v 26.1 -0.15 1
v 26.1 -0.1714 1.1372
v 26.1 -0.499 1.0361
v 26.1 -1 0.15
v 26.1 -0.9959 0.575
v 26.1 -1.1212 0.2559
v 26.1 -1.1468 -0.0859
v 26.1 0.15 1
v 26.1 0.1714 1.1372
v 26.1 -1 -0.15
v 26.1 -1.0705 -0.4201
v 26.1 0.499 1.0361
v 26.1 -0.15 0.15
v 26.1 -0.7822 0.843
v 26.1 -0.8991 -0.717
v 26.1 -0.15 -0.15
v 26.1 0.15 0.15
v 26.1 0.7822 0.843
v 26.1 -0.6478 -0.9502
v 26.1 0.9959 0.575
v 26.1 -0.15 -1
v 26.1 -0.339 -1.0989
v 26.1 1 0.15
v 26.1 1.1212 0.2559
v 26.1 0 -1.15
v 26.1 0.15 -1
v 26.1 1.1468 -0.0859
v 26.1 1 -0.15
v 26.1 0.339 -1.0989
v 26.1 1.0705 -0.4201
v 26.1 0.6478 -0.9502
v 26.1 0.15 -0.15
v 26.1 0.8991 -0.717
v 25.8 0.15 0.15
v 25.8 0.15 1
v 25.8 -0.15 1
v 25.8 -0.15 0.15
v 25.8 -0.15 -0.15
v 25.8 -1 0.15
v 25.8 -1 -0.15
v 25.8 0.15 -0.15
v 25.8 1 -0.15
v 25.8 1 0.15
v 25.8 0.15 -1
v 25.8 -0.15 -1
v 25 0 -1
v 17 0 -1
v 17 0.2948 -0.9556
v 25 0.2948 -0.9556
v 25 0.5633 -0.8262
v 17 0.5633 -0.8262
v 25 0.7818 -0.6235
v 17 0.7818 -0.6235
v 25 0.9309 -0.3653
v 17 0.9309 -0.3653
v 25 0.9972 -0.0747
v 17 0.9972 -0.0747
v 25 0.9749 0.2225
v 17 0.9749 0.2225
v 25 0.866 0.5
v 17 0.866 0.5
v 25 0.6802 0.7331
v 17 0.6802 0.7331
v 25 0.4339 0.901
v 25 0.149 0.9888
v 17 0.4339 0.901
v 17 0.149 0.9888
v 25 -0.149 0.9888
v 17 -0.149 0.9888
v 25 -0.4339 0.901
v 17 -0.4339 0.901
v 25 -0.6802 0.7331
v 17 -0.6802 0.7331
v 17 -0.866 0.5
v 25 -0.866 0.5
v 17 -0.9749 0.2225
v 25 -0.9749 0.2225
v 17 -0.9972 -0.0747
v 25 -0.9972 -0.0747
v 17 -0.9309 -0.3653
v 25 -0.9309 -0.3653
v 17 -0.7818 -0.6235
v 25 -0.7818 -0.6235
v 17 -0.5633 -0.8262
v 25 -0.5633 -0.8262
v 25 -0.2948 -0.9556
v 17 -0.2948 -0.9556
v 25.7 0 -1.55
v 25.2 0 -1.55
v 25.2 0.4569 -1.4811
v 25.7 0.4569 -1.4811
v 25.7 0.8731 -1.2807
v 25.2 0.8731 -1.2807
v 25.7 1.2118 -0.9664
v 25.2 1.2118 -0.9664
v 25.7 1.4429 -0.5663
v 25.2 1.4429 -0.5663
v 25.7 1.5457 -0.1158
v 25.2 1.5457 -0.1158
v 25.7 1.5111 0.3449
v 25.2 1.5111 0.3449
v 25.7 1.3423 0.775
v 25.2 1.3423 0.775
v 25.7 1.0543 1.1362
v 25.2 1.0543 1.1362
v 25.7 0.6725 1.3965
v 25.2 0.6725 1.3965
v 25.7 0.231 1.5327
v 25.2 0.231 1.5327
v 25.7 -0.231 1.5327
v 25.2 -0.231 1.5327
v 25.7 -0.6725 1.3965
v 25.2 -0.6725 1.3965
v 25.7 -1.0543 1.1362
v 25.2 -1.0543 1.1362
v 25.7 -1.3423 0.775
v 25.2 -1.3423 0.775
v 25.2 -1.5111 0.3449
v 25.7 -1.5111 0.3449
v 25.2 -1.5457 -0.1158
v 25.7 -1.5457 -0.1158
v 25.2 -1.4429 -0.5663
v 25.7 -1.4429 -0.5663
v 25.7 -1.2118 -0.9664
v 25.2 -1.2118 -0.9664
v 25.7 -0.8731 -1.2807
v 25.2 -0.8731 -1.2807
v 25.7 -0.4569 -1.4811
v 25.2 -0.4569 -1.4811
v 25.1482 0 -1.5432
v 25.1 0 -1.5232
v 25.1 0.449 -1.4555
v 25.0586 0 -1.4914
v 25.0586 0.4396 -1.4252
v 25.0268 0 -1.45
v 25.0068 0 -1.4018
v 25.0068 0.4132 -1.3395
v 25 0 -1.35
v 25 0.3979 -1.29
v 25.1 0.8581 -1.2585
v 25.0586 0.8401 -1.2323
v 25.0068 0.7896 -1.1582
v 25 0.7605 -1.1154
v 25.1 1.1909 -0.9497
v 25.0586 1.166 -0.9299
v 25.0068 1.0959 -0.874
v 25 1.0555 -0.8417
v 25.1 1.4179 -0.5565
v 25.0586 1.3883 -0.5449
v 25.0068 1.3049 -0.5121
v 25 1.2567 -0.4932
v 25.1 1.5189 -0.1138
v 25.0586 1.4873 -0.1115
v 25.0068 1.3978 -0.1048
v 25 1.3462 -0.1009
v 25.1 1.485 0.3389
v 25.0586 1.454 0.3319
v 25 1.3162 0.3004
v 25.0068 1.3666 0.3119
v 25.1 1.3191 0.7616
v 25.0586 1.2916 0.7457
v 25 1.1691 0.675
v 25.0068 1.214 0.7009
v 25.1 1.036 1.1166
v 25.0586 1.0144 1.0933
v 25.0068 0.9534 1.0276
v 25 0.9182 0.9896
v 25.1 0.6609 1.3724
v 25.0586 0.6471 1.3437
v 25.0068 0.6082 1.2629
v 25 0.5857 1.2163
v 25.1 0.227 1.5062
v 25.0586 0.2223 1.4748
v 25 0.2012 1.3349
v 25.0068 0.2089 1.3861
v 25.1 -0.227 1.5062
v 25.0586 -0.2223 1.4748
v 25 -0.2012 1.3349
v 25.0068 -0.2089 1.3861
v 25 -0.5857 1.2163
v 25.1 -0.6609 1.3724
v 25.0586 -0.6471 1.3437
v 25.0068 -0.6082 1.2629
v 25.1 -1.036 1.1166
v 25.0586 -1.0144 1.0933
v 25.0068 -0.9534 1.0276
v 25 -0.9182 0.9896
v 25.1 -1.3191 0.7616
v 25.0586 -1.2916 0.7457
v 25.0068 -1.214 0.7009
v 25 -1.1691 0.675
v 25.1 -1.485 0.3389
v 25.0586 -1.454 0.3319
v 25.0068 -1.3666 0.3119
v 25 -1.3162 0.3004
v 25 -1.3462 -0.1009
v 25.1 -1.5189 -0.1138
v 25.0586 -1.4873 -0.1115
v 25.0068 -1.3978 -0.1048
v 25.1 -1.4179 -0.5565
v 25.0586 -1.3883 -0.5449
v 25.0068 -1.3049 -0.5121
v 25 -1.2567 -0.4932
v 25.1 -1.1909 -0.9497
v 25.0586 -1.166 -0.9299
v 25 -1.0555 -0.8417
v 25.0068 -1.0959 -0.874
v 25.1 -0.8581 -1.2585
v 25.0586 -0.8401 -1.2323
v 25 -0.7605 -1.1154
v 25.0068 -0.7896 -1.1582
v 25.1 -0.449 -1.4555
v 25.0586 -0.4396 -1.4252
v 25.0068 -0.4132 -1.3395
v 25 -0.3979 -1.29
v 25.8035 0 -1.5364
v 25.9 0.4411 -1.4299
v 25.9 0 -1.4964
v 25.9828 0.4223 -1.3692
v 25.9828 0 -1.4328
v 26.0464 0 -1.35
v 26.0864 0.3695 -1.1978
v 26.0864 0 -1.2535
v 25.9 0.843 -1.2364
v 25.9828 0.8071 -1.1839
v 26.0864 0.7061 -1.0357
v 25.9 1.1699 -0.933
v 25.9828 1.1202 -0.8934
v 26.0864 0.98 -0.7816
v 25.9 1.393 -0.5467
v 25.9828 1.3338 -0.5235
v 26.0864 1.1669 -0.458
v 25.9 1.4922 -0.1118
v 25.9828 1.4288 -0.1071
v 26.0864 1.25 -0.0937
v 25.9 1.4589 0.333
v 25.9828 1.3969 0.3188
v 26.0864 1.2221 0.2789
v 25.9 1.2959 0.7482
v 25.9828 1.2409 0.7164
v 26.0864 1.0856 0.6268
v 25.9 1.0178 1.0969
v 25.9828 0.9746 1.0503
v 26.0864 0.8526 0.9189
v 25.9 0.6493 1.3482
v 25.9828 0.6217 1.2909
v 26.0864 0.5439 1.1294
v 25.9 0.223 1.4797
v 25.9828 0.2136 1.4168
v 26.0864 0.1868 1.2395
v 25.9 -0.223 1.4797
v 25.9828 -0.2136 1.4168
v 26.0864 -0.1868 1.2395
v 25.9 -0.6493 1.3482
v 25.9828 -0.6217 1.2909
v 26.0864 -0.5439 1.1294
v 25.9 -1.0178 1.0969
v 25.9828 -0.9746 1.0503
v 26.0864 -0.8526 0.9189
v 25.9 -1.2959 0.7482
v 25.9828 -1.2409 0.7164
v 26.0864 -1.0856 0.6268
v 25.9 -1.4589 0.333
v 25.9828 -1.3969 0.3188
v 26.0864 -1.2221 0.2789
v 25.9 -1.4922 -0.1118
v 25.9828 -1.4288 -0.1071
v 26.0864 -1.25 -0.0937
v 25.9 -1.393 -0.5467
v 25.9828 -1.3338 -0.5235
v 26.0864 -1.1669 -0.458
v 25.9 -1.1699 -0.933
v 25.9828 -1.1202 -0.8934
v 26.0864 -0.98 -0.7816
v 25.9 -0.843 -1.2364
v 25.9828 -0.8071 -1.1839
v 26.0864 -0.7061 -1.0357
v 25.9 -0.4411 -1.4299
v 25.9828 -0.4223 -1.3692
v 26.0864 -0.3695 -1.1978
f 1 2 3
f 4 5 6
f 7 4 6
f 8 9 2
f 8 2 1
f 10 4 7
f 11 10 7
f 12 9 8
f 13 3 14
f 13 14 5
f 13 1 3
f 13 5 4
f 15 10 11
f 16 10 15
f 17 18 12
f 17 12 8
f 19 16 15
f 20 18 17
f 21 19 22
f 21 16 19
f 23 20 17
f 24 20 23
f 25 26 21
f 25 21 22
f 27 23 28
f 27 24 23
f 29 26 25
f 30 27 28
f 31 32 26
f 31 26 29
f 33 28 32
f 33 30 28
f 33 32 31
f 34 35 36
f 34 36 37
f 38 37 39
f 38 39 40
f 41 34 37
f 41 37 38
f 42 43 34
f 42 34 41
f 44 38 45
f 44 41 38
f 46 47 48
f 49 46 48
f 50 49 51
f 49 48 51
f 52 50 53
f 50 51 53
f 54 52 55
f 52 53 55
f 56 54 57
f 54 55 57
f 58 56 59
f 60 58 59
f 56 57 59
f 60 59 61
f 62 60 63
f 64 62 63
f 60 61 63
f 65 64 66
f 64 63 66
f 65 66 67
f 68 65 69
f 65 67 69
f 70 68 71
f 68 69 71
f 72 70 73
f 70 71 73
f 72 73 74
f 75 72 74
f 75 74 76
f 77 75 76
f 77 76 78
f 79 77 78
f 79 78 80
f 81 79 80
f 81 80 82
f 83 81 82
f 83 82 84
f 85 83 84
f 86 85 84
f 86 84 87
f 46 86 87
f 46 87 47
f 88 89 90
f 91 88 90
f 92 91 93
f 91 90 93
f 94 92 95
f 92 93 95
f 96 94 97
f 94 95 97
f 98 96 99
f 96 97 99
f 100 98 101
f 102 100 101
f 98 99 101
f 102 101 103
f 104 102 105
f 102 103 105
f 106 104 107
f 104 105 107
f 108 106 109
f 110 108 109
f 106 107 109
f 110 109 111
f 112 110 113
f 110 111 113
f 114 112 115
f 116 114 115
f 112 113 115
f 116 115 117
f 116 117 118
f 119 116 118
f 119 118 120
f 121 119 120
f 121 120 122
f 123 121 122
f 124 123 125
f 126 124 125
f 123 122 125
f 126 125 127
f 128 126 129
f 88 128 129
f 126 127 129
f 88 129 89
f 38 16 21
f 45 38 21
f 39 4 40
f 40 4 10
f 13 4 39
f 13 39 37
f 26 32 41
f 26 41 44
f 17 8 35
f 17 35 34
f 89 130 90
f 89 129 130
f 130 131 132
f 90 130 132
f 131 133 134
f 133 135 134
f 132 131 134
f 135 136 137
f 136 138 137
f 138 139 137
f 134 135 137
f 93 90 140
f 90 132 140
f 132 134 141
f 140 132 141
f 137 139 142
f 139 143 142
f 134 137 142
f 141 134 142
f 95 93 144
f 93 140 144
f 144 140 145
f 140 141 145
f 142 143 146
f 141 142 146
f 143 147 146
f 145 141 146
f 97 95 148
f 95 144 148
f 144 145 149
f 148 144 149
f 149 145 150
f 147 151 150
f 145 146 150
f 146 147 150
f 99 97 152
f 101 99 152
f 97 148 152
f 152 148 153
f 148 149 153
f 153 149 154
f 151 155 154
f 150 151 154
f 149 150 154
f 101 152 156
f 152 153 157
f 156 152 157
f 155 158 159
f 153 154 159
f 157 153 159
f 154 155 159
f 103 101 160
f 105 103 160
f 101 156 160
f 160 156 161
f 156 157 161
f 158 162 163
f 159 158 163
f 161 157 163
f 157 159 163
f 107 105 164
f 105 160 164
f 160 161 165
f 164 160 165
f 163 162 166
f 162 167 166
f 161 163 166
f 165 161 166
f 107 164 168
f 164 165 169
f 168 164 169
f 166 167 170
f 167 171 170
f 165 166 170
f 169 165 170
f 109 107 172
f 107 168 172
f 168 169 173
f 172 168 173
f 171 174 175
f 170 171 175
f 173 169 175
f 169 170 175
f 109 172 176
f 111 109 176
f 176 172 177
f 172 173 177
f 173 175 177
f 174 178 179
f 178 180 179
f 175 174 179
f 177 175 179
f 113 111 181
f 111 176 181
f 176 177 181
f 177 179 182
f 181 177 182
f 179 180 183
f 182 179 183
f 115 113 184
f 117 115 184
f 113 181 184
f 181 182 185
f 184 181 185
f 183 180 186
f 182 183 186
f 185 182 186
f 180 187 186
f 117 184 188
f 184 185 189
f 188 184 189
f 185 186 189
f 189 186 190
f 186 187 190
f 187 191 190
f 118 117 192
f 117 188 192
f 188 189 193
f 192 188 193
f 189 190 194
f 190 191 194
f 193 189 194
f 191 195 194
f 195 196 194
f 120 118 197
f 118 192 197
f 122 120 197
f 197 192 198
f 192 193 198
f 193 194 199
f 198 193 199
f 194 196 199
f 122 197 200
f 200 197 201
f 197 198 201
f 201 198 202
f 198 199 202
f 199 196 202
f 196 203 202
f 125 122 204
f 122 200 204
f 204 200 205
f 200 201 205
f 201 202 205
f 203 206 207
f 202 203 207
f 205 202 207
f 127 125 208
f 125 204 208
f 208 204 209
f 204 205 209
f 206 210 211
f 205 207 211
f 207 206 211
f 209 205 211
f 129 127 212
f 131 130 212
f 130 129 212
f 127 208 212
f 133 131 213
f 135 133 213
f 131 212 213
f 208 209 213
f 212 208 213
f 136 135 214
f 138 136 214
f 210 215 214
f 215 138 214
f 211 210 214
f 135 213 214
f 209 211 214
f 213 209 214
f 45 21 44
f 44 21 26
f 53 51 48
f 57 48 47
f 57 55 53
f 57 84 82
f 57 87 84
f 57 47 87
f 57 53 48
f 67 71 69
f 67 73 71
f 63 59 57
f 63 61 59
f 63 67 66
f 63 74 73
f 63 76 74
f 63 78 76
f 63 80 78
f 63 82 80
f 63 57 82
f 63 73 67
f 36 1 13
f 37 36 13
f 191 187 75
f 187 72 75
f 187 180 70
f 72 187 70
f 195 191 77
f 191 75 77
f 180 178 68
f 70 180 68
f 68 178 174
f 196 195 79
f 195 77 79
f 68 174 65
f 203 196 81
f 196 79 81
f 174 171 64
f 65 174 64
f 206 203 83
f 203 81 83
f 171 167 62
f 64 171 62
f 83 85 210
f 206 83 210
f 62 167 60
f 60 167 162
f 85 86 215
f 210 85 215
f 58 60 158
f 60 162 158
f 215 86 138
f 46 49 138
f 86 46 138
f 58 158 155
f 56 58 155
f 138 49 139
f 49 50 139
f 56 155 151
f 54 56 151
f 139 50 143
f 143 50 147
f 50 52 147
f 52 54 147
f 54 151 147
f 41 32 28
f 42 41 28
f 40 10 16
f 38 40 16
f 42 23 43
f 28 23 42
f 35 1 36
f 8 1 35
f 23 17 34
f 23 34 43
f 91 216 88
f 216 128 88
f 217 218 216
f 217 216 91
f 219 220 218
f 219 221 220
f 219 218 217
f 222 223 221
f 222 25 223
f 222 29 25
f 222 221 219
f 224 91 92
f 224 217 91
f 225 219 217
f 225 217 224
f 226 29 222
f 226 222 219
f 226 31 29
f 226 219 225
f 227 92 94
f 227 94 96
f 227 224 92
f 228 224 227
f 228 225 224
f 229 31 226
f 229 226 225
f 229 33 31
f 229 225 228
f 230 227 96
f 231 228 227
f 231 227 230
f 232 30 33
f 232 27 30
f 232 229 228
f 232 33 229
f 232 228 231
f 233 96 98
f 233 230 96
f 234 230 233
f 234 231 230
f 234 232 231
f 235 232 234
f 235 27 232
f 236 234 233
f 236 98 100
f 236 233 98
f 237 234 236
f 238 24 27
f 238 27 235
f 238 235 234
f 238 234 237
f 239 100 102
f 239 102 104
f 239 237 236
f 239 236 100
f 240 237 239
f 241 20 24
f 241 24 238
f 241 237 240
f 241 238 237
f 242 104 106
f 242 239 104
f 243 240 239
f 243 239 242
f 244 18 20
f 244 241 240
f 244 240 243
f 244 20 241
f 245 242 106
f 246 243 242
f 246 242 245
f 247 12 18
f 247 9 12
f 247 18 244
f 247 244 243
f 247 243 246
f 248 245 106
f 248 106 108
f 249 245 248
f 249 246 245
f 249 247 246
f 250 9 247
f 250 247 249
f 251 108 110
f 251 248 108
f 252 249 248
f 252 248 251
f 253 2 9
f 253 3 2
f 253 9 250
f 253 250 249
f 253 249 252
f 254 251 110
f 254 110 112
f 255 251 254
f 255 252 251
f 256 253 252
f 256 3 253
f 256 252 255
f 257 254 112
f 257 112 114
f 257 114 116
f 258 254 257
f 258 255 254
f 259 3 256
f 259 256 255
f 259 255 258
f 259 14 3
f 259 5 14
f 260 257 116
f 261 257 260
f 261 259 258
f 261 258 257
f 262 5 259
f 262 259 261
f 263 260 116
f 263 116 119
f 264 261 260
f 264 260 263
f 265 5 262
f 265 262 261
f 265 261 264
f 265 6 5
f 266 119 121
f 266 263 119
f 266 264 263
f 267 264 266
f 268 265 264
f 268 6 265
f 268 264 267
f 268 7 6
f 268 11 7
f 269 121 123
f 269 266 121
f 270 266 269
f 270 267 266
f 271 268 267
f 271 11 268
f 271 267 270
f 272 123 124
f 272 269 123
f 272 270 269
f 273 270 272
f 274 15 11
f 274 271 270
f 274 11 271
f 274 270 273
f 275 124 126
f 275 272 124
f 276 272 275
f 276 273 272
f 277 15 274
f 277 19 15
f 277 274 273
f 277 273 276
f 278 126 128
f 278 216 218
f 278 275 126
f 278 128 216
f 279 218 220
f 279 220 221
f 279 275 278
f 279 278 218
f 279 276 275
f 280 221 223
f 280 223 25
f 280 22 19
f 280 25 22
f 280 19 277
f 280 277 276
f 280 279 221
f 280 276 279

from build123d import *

# Parameters (mm, degrees)
ESBO_O1_R                = 1
RESSALTO_EXTRUS_O1_DEPTH = 25
ESBO_O2_R                = 1.55
RESSALTO_EXTRUS_O2_DEPTH = 1.1
SKETCH1_R                = 1
CUT_EXTRUDE1_DEPTH       = 17
SKETCH2_W                = 0.85
SKETCH2_H                = 0.3
SKETCH2_W_2              = 0.3
SKETCH2_H_2              = 0.85
CUT_EXTRUDE3_DEPTH       = 0.3
FILLET1_R                = 0.4
FILLET2_R                = 0.2


with BuildPart() as part:
    # Esboço1 → Ressalto-extrusão1 (new body)
    with BuildSketch(Plane(origin=(0, 0, 0), x_dir=(0, 0, -1), z_dir=(1, 0, 0))):
        Circle(ESBO_O1_R)
    extrude(amount=RESSALTO_EXTRUS_O1_DEPTH)

    # Esboço2 → Ressalto-extrusão2 (add)
    with BuildSketch(Plane(origin=(25, 0, 0), x_dir=(0, 0, -1), z_dir=(1, 0, 0))):
        Circle(ESBO_O2_R)
    extrude(amount=RESSALTO_EXTRUS_O2_DEPTH)

    # Sketch1 → Cut-Extrude1 (cut)
    with BuildSketch(Plane.ZY):
        Circle(SKETCH1_R)
    extrude(amount=-CUT_EXTRUDE1_DEPTH, mode=Mode.SUBTRACT)

    # Sketch2 → Cut-Extrude3 (cut)
    with BuildSketch(Plane(origin=(26.1, 0, 0), x_dir=(0, 0, -1), z_dir=(1, 0, 0))):
        with Locations((0.575, 0)):
            Rectangle(SKETCH2_W, SKETCH2_H)
        with Locations((-0.575, 0)):
            Rectangle(SKETCH2_W, SKETCH2_H)
        with Locations((0, 0.575)):
            Rectangle(SKETCH2_W_2, SKETCH2_H_2)
        with Locations((0, -0.575)):
            Rectangle(SKETCH2_W_2, SKETCH2_H_2)
        Rectangle(SKETCH2_W_2, SKETCH2_H)
    extrude(amount=-CUT_EXTRUDE3_DEPTH, mode=Mode.SUBTRACT)

    # Fillet1
    fillet1_edges = [part.edges().sort_by_distance(p)[0] for p in [
        (26.1, 0, 1.55),
    ]]
    fillet(fillet1_edges, radius=FILLET1_R)

    # Fillet2
    fillet2_edges = [part.edges().sort_by_distance(p)[0] for p in [
        (25, 0, 1.55),
    ]]
    fillet(fillet2_edges, radius=FILLET2_R)


solid = part.part
